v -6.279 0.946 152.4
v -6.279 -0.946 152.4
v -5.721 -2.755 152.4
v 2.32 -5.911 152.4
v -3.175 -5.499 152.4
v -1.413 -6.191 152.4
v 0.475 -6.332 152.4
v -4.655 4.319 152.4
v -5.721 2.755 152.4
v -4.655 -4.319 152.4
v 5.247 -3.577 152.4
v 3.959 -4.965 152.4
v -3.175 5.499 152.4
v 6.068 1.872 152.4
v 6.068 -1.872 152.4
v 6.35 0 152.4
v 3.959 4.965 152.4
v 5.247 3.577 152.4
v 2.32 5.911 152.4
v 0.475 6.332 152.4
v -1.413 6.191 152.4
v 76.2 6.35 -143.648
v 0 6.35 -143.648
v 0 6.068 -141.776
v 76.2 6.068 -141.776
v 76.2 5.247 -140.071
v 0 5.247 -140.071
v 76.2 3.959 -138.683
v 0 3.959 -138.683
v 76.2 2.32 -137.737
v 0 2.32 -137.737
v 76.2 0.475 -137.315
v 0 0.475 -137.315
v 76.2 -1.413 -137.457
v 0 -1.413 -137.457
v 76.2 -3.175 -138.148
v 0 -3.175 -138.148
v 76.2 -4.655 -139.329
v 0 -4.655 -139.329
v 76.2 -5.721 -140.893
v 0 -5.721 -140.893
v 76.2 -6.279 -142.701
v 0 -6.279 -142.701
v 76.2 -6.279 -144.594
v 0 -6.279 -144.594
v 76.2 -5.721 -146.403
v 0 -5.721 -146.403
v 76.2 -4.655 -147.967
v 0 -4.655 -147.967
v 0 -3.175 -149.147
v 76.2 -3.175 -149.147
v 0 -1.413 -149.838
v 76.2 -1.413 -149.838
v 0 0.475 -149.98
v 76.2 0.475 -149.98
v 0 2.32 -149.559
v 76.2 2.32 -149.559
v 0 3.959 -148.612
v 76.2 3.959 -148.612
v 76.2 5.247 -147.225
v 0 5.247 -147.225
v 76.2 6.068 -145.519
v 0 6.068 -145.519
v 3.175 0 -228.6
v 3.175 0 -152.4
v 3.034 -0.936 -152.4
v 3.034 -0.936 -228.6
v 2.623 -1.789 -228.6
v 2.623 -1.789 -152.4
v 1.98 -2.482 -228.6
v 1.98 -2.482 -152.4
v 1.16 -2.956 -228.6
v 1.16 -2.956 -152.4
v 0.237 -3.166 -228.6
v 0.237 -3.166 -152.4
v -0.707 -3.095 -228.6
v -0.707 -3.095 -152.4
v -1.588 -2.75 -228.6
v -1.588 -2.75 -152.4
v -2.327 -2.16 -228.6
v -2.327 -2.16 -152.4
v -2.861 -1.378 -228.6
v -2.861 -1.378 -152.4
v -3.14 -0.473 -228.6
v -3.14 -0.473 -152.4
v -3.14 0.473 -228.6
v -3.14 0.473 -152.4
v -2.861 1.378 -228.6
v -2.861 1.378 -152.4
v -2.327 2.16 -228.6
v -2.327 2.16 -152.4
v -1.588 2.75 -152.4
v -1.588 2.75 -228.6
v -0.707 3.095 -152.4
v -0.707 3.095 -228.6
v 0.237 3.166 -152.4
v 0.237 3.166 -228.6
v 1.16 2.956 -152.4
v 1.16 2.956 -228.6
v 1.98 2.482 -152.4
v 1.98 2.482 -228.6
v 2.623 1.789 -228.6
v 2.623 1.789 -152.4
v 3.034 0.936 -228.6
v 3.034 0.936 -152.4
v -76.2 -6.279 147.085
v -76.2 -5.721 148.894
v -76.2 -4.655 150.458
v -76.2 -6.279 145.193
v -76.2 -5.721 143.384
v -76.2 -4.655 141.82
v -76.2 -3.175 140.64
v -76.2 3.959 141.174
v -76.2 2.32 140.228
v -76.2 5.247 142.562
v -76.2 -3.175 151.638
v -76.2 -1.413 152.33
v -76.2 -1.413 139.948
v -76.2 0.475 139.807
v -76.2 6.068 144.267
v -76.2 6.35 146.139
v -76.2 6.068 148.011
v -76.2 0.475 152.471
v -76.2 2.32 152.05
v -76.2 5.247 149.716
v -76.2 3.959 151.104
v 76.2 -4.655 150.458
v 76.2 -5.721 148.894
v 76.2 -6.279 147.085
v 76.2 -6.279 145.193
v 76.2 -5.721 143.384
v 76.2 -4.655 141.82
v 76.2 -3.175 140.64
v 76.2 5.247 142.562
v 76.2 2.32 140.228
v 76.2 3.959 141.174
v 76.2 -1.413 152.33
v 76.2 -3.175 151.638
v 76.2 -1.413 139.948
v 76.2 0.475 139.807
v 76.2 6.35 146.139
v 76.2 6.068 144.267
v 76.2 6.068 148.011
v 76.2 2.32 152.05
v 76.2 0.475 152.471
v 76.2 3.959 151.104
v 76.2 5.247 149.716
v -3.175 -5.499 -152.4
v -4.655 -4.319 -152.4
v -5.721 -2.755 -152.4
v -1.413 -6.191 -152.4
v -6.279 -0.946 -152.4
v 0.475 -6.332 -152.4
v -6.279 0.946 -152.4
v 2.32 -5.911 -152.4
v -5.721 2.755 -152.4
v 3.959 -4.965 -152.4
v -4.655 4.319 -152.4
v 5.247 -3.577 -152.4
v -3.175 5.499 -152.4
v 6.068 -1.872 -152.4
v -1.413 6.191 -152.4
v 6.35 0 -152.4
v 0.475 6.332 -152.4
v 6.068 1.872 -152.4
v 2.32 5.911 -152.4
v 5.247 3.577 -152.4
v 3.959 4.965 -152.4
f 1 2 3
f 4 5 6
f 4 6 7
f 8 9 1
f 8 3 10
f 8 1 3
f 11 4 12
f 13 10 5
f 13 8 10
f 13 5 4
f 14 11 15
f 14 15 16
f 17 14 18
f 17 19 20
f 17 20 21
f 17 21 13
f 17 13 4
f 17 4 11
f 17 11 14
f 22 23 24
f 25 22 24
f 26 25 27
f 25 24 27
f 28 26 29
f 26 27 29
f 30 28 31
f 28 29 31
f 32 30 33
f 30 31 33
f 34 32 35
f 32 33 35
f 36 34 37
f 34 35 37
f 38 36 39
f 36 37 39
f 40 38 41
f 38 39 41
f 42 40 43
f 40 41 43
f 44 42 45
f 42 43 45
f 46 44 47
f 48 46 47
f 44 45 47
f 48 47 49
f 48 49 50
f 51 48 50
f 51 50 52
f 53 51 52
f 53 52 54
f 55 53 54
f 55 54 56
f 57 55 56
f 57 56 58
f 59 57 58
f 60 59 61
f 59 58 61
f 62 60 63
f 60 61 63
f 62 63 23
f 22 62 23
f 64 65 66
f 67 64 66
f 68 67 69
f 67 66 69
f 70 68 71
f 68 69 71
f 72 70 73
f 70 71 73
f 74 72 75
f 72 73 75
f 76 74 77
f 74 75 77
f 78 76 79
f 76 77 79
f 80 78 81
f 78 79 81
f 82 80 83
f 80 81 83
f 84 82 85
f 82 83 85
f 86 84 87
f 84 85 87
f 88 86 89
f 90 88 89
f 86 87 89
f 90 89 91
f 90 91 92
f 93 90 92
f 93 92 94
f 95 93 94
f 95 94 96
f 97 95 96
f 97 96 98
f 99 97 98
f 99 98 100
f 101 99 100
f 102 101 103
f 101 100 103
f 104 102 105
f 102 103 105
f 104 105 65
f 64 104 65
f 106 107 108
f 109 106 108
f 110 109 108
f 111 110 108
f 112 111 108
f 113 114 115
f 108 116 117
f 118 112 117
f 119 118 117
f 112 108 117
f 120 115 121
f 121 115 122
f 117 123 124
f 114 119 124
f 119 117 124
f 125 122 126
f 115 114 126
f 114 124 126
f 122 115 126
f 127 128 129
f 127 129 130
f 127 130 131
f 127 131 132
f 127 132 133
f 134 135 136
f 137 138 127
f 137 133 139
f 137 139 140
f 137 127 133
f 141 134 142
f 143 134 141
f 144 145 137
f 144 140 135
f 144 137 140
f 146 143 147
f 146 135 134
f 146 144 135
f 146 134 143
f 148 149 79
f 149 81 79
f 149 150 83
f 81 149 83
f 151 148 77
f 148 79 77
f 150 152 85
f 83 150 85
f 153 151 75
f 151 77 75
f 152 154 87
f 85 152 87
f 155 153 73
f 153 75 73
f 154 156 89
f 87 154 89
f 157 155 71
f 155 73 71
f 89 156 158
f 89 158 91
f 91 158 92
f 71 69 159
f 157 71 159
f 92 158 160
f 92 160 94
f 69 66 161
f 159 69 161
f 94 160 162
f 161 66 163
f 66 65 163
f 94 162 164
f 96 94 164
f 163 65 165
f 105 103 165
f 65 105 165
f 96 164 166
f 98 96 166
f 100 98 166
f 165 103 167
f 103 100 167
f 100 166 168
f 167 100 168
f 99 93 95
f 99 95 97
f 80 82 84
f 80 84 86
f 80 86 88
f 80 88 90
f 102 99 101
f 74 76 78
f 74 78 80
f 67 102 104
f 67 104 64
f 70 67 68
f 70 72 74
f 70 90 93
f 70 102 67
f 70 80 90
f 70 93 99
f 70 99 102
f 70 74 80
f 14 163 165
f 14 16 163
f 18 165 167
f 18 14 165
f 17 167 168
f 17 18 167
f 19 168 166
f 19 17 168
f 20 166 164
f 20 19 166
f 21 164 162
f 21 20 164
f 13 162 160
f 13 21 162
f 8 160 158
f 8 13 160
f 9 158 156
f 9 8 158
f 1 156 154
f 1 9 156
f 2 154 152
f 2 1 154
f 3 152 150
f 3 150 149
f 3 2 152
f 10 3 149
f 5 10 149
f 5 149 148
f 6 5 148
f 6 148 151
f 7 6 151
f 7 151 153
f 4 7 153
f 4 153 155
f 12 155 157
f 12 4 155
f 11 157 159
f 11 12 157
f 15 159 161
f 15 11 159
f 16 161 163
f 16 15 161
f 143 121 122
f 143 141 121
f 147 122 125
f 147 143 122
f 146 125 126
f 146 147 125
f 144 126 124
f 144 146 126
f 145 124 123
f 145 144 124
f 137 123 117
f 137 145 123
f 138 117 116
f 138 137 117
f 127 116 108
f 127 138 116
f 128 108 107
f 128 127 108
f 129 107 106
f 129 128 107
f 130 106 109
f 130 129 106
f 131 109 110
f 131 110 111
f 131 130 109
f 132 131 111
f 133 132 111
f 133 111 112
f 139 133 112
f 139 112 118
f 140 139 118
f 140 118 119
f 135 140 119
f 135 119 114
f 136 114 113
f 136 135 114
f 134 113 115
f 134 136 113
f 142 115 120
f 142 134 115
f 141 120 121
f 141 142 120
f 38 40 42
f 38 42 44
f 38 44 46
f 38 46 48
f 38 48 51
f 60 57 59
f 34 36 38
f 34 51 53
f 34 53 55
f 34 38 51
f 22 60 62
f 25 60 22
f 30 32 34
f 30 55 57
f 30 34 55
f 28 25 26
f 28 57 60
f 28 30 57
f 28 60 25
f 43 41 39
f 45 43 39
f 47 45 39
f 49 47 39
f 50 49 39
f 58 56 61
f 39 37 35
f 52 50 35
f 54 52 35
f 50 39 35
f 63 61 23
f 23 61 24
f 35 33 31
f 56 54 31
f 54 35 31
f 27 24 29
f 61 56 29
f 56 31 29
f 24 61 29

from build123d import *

# Parameters (mm, degrees)
F0_R     = 6.35
F1_DEPTH = 152.4
F2_R     = 6.35
F3_DEPTH = 76.2
F4_R     = 6.35
F5_DEPTH = 76.2
F6_R     = 3.175
F7_DEPTH = 76.2


with BuildPart() as f1:
    # F0 (on Top) → F1 (new body, symmetric)
    with BuildSketch(Plane.XY):
        Circle(F0_R)
    extrude(amount=F1_DEPTH, both=True)

    # F6 (on face) → F7 (join)
    with BuildSketch(Plane(origin=(0, 0, -152.4), x_dir=(1, 0, 0), z_dir=(0, 0, -1))):
        Circle(F6_R)
    extrude(amount=F7_DEPTH)


with BuildPart() as f3:
    # F2 (on Right) → F3 (new body, symmetric)
    with BuildSketch(Plane.YZ):
        with Locations((0, 146.138966)):
            Circle(F2_R)
    extrude(amount=F3_DEPTH, both=True)


with BuildPart() as f5:
    # F4 (on Right) → F5 (new body)
    with BuildSketch(Plane.YZ):
        with Locations((0, -143.647701)):
            Circle(F4_R)
    extrude(amount=F5_DEPTH)


solid = Compound([f1.part, f3.part, f5.part])
